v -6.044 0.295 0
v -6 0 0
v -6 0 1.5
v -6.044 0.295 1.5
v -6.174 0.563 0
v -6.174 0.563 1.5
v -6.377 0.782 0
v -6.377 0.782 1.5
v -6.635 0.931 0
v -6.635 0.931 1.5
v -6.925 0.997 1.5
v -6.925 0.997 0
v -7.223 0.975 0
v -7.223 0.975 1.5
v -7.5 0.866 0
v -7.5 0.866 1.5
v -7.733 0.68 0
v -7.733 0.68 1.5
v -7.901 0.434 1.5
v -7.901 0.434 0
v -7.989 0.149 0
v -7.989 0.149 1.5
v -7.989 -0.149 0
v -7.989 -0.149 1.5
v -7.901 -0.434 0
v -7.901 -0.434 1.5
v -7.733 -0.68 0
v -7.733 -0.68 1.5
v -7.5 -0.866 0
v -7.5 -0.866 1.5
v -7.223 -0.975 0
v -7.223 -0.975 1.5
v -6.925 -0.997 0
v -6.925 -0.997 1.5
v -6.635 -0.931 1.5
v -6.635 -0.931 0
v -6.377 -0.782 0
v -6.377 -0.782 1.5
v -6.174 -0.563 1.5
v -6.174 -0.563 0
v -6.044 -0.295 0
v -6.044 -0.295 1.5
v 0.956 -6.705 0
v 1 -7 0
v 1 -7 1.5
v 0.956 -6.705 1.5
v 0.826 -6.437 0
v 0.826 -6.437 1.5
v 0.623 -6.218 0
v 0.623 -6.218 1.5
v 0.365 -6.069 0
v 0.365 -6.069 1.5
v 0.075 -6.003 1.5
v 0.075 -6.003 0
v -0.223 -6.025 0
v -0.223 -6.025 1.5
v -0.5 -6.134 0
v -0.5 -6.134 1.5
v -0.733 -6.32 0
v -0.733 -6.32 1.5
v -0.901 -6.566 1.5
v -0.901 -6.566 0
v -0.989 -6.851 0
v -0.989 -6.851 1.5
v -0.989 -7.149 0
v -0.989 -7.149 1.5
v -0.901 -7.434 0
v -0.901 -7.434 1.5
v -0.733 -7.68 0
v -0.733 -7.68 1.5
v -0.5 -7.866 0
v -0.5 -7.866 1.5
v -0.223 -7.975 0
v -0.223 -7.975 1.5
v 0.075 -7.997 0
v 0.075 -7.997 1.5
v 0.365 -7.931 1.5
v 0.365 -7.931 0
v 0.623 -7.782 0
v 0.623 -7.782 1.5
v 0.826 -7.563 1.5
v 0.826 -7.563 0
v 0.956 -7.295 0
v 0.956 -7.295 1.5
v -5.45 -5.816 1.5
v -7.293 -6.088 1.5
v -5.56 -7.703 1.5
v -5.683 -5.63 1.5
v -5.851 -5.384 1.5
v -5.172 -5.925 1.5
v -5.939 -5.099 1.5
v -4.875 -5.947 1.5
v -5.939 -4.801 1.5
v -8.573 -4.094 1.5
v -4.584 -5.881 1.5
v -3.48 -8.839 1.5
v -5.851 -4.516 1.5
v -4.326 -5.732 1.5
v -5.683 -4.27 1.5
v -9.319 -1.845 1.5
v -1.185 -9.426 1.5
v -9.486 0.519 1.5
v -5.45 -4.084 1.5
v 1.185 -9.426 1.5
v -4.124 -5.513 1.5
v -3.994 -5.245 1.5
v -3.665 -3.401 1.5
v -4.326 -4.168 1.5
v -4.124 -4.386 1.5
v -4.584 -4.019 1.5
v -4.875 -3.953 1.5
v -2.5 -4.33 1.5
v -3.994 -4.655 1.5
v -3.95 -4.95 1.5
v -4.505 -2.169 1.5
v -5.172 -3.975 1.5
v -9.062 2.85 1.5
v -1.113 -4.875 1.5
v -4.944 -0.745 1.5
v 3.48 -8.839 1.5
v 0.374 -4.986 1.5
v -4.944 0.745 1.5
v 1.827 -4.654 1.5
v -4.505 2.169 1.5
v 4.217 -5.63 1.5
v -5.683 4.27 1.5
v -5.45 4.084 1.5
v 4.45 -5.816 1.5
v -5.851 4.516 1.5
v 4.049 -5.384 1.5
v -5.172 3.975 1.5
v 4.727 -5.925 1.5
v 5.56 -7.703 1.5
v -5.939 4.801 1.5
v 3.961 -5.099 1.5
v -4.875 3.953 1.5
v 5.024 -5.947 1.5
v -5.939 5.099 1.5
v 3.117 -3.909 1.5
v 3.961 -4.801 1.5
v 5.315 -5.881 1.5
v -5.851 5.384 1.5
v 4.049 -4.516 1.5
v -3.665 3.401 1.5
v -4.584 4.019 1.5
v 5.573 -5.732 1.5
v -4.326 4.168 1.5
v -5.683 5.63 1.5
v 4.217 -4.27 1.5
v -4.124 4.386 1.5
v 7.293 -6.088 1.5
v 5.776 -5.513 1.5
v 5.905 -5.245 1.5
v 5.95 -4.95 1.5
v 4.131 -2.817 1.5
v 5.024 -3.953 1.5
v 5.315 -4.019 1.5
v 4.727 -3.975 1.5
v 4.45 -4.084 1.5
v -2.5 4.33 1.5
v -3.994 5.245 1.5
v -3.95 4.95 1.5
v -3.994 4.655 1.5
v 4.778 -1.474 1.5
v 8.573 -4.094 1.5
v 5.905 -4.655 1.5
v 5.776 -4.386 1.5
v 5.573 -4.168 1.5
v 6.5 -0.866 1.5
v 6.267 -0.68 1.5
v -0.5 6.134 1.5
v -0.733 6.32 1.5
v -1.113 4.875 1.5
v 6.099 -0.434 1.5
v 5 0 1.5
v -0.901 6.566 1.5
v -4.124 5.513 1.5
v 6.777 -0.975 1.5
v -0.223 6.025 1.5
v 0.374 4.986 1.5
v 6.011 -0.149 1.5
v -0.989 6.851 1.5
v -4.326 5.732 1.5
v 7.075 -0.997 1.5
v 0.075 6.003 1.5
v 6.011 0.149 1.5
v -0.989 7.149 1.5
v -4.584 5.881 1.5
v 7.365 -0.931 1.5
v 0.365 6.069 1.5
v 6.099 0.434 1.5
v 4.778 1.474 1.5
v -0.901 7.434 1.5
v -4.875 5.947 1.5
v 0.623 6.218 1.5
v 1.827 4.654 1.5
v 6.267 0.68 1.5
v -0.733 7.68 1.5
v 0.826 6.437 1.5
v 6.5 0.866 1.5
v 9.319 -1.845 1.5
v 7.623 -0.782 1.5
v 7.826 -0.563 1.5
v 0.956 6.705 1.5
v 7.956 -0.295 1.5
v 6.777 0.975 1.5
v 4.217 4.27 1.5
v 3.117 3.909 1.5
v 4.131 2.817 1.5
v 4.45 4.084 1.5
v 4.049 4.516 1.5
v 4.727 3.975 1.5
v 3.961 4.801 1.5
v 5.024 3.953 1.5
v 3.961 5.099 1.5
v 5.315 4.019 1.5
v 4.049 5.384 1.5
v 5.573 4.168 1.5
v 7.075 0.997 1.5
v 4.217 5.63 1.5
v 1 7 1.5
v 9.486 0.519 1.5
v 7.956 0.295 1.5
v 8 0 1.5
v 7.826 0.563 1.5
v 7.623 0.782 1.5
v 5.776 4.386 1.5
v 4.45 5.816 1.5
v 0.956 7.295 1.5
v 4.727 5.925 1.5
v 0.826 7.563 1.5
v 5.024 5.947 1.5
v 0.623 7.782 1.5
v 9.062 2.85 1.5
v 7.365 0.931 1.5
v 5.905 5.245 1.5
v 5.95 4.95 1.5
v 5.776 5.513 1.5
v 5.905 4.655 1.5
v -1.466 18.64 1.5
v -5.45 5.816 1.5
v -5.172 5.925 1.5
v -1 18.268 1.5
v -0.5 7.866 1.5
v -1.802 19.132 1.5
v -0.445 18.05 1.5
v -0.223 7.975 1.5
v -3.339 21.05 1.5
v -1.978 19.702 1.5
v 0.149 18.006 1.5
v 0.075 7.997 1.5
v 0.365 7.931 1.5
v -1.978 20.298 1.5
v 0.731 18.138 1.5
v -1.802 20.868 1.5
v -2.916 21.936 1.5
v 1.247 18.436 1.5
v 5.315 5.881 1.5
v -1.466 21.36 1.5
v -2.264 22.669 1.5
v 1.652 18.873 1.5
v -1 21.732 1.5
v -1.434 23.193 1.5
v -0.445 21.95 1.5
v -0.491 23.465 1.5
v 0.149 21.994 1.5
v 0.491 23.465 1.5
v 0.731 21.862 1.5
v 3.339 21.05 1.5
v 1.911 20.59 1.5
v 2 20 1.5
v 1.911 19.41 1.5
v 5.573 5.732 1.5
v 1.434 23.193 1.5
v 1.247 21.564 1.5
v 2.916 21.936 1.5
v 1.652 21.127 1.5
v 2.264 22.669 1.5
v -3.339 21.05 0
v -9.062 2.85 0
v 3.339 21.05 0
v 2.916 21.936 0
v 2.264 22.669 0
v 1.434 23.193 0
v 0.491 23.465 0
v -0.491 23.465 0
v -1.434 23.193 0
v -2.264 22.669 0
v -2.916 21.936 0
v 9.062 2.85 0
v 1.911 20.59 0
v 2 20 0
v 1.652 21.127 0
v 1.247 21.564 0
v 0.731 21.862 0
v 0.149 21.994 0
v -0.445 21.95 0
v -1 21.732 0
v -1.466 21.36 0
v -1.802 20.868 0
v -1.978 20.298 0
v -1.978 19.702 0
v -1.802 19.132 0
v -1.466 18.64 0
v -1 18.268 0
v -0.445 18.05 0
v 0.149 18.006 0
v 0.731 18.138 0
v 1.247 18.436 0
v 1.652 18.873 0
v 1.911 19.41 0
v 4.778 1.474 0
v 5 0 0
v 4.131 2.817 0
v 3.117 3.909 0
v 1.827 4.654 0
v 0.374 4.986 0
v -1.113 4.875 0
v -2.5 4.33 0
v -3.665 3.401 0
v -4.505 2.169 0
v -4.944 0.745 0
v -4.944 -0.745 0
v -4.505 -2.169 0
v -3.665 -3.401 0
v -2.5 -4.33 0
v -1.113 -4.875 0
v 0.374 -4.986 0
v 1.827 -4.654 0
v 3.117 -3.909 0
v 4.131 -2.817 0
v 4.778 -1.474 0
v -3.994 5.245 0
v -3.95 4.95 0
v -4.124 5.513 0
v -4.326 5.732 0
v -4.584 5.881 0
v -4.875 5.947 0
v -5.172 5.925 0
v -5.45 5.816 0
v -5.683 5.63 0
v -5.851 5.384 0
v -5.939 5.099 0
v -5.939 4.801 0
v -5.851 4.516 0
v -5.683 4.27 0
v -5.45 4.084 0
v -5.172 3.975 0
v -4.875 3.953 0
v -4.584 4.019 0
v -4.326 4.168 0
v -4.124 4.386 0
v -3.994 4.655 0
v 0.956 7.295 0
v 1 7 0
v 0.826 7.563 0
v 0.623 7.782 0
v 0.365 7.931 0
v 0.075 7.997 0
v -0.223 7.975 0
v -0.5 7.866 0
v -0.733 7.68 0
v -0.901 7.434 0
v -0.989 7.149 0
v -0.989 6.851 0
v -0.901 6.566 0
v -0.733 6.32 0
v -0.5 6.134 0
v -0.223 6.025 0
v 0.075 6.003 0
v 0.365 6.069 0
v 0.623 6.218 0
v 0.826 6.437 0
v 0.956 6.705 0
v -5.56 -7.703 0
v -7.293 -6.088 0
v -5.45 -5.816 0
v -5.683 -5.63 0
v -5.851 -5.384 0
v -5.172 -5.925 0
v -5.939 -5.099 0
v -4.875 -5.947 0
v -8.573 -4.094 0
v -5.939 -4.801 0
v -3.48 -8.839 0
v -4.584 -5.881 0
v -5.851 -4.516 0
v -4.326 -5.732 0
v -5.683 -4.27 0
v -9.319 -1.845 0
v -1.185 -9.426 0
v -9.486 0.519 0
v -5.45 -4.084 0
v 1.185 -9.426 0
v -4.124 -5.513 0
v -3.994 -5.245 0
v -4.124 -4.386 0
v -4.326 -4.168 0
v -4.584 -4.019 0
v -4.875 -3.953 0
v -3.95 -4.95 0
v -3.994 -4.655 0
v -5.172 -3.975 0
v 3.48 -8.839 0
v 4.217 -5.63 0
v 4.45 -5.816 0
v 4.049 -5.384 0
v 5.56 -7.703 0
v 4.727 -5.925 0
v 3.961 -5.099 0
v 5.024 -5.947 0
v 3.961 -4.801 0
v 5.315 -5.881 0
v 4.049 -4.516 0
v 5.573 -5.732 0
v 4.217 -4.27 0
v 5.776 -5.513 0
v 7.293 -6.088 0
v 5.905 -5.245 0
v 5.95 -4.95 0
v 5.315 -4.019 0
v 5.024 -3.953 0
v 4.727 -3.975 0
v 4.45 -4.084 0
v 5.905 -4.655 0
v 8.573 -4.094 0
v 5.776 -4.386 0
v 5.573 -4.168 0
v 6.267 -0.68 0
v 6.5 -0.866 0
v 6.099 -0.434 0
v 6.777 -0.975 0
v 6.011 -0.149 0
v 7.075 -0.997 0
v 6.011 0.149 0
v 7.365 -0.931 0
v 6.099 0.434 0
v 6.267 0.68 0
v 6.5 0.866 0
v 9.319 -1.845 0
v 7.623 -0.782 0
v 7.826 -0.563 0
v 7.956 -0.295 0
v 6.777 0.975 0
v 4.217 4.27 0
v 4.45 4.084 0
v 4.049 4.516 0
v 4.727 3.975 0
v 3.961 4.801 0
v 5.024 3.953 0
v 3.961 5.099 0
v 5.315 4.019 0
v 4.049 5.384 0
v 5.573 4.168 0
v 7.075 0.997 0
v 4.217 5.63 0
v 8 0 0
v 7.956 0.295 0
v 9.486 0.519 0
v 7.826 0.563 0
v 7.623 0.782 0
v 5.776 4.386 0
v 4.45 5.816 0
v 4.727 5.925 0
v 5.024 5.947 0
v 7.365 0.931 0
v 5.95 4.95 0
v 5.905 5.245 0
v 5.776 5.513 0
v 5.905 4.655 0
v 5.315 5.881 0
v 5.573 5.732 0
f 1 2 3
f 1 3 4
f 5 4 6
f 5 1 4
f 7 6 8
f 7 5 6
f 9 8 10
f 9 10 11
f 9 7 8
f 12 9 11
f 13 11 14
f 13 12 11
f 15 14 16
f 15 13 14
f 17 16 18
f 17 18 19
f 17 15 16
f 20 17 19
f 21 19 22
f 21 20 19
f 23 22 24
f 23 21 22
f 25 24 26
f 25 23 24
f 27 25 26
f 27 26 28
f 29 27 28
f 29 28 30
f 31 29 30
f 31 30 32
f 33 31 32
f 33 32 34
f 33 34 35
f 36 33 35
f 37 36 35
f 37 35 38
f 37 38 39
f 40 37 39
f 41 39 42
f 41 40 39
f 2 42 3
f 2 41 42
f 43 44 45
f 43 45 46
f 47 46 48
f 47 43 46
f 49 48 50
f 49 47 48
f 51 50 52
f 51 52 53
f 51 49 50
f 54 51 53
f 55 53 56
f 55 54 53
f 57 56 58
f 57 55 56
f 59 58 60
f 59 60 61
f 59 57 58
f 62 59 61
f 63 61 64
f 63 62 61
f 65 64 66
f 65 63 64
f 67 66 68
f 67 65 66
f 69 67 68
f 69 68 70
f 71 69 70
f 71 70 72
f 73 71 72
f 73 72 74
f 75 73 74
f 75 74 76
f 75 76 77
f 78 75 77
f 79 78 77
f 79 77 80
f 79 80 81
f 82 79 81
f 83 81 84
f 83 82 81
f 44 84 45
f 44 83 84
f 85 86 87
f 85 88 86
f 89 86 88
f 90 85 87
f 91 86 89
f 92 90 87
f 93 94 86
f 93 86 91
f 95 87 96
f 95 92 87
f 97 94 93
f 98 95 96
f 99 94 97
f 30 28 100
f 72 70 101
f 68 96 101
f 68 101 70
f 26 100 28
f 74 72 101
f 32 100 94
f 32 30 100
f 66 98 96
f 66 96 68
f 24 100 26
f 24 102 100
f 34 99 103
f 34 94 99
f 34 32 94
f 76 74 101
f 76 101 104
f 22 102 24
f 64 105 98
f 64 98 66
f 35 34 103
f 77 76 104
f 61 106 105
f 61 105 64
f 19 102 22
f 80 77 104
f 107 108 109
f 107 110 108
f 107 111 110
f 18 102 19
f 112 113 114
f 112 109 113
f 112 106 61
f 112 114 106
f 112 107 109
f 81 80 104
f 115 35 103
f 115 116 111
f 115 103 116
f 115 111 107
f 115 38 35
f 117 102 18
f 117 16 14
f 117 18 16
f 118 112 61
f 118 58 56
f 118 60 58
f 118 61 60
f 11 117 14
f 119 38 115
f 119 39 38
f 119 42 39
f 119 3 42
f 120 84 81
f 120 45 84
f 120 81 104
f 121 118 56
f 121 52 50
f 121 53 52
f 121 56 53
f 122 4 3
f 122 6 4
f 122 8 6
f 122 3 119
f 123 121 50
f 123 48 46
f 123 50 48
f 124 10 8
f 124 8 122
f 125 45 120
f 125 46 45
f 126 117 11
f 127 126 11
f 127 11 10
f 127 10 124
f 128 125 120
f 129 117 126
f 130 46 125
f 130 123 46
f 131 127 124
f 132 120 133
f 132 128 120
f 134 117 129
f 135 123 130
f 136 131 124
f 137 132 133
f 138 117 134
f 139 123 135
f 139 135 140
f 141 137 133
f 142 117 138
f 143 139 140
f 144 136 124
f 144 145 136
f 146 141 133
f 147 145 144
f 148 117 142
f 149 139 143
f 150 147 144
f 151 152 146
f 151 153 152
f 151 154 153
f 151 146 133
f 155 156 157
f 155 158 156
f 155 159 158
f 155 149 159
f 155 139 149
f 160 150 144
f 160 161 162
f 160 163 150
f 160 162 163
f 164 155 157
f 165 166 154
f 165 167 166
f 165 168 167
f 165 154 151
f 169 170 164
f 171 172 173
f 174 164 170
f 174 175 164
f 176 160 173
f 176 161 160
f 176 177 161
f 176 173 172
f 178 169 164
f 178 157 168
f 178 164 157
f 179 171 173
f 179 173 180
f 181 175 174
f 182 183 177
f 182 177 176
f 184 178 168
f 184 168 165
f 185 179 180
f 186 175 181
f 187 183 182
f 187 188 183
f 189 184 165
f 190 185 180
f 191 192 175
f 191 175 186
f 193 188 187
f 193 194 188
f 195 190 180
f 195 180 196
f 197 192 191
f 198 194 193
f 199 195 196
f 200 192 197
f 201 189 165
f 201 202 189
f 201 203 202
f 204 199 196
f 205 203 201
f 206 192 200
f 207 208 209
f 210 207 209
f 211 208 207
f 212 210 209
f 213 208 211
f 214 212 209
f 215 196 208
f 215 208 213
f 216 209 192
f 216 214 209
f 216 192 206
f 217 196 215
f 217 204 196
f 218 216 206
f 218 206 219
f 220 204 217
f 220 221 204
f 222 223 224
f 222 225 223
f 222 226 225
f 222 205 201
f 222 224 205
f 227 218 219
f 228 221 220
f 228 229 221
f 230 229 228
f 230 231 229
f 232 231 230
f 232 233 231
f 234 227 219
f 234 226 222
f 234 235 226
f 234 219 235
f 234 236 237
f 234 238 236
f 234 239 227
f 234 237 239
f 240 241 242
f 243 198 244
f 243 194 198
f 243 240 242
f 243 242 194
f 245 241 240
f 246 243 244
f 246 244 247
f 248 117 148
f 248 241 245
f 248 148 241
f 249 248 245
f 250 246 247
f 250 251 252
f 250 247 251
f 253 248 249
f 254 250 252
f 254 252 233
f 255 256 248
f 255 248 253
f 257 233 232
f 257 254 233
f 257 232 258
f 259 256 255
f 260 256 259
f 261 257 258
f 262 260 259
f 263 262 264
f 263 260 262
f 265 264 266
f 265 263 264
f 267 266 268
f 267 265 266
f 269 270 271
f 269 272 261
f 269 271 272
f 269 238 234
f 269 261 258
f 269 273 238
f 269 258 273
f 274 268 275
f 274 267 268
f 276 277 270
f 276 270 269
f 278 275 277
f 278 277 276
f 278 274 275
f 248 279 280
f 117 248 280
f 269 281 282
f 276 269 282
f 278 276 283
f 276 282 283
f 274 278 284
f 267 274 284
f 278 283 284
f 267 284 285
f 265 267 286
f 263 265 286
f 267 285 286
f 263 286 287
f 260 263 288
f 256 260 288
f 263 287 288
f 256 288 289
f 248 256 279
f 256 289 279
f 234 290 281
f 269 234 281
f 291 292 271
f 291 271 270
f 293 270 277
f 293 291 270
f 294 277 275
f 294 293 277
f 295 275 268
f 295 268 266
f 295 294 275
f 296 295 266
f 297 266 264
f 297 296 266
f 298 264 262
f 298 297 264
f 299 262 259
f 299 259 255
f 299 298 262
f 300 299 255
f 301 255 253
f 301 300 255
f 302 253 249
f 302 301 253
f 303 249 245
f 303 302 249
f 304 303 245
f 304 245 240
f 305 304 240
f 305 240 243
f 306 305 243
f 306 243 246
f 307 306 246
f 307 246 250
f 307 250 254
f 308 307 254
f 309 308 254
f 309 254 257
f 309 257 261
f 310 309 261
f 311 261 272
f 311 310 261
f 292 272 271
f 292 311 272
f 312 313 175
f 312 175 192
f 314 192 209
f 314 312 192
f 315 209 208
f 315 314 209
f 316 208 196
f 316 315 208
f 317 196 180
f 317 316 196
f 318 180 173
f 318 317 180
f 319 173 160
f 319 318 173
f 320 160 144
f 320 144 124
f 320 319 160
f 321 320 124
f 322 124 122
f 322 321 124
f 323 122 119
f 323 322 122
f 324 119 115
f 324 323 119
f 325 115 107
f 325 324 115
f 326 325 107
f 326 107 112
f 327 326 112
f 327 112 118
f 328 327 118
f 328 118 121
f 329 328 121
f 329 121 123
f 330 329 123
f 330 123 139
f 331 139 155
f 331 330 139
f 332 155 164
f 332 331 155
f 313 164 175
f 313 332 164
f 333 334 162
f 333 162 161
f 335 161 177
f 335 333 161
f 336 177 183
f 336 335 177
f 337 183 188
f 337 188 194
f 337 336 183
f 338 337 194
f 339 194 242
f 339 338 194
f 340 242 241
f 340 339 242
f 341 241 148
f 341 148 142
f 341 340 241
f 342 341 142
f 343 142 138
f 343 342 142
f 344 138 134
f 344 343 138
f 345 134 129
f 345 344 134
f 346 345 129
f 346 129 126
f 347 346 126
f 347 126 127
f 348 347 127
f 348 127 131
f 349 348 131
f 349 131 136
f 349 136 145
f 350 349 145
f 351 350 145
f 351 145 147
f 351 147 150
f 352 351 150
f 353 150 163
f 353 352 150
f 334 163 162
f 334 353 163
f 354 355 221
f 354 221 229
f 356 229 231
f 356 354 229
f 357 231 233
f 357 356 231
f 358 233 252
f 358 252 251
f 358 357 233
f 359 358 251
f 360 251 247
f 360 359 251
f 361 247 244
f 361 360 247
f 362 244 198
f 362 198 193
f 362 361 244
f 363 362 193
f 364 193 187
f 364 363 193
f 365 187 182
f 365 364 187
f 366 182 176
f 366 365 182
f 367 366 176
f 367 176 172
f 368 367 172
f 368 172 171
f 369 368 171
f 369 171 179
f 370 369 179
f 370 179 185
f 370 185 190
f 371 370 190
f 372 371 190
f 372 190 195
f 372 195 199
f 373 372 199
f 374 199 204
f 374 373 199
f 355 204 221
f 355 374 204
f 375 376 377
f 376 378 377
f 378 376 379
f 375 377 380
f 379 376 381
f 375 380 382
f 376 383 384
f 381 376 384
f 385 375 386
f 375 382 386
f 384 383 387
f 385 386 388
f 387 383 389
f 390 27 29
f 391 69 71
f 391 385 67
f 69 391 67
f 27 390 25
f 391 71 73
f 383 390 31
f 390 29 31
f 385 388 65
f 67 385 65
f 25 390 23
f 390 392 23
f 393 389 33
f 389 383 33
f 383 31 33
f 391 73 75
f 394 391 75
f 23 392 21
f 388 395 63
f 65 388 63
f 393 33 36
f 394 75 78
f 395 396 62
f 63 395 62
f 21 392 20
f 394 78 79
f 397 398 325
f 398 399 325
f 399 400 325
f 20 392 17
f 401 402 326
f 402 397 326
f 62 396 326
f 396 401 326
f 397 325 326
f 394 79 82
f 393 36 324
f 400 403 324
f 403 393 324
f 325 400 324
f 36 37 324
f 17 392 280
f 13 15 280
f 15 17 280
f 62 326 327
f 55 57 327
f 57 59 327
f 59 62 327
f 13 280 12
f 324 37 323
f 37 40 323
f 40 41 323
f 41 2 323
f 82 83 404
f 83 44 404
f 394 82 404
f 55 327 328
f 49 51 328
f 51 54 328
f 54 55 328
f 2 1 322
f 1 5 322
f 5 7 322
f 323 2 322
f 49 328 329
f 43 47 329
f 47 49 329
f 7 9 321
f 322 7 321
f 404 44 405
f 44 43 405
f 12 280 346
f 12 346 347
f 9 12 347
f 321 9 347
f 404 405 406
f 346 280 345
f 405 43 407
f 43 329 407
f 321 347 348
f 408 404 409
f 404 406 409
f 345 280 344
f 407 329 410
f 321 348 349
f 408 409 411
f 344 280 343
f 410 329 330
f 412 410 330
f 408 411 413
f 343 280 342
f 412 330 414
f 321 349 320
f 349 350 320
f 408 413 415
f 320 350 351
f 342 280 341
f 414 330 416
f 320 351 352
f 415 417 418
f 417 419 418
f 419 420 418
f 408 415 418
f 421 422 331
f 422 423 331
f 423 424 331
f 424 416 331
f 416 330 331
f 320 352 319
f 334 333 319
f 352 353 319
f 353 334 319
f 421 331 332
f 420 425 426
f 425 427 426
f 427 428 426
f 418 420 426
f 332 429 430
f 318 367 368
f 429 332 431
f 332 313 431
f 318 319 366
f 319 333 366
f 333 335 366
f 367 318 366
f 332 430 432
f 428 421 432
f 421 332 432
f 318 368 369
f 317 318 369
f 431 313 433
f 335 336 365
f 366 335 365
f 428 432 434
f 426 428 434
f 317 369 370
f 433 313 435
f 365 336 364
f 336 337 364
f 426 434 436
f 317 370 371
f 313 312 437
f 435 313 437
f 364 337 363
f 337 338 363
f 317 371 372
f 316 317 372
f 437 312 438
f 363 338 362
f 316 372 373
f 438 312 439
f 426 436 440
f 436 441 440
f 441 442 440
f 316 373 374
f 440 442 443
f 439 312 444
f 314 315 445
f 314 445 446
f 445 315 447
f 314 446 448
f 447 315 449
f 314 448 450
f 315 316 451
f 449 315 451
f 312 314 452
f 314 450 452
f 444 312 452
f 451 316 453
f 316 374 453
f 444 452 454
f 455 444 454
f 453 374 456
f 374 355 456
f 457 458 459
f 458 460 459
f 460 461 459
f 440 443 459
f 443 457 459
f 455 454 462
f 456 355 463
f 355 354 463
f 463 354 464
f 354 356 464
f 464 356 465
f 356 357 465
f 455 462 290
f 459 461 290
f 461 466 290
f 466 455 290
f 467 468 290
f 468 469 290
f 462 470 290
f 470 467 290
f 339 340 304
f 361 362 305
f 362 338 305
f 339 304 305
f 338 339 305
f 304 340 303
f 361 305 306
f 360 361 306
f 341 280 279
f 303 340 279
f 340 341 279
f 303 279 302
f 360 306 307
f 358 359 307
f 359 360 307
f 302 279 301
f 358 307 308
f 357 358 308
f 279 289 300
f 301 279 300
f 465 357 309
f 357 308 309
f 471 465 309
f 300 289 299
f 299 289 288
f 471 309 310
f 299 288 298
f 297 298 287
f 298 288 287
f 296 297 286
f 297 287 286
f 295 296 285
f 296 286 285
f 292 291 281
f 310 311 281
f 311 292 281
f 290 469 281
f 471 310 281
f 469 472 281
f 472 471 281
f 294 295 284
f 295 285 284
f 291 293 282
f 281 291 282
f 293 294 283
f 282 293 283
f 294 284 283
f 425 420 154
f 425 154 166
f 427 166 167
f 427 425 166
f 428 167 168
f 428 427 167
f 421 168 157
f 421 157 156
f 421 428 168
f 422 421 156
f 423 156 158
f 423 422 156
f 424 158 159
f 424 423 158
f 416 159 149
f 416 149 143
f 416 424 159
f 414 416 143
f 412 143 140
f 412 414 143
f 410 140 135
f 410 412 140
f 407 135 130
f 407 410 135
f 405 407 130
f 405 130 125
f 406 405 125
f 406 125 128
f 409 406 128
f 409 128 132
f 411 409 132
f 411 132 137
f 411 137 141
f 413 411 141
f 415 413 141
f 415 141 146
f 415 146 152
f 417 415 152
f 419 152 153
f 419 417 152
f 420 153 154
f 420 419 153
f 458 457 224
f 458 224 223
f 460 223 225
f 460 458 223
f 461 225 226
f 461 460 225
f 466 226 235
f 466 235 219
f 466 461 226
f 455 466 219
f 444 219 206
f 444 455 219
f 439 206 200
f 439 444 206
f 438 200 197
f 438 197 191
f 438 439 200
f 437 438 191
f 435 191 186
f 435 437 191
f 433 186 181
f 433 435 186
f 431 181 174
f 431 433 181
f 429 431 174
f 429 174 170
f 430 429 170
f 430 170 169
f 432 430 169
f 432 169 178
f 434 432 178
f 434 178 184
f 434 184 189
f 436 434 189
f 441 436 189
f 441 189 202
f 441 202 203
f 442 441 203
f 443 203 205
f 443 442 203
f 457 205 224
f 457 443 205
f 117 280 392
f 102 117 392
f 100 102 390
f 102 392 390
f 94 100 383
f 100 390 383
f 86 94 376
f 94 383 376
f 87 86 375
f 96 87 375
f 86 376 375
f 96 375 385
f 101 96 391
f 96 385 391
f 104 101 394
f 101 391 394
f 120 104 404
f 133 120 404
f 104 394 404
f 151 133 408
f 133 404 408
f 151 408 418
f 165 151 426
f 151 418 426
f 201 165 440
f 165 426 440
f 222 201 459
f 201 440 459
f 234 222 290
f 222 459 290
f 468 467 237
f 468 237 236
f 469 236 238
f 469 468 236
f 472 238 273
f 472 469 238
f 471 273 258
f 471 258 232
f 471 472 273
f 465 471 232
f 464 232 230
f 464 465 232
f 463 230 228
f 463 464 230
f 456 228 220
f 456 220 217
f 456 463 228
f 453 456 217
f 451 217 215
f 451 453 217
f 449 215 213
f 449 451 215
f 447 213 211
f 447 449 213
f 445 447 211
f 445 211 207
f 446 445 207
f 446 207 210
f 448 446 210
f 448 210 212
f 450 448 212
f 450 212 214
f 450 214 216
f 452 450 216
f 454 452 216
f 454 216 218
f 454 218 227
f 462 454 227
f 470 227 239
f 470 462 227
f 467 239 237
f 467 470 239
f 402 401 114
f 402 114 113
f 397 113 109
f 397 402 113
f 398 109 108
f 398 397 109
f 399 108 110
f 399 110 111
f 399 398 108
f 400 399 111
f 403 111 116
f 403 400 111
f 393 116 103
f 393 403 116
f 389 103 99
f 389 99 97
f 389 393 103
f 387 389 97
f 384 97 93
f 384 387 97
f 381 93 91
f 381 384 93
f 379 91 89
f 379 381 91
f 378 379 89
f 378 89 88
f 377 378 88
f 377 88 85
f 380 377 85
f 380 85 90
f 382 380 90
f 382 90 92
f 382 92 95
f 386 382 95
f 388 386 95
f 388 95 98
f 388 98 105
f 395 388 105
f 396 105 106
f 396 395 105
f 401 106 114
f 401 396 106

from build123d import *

# Parameters (mm, degrees)
F0_R     = 1
F0_R_2   = 5
F0_R_3   = 2
F1_DEPTH = 1.5


with BuildPart() as f1:
    # F0 (on Top) → F1 (new body)
    with BuildSketch(Plane.XY):
        with BuildLine():
            Line((9.062422, 2.85), (3.338787, 21.05))
            ThreePointArc((3.338787, 21.05), (0, 23.5), (-3.338787, 21.05))
            Line((-3.338787, 21.05), (-9.062422, 2.85))
            ThreePointArc((-9.062422, 2.85), (0, -9.5), (9.062422, 2.85))
        make_face()
        with Locations((-4.949747, -4.949747)):
            Circle(F0_R, mode=Mode.SUBTRACT)
        with Locations((-7, 0)):
            Circle(F0_R, mode=Mode.SUBTRACT)
        with Locations((-4.949747, 4.949747)):
            Circle(F0_R, mode=Mode.SUBTRACT)
        with Locations((0, -7)):
            Circle(F0_R, mode=Mode.SUBTRACT)
        with Locations((4.949747, -4.949747)):
            Circle(F0_R, mode=Mode.SUBTRACT)
        Circle(F0_R_2, mode=Mode.SUBTRACT)
        with Locations((7, 0)):
            Circle(F0_R, mode=Mode.SUBTRACT)
        with Locations((4.949747, 4.949747)):
            Circle(F0_R, mode=Mode.SUBTRACT)
        with Locations((0, 7)):
            Circle(F0_R, mode=Mode.SUBTRACT)
        with Locations((0, 20)):
            Circle(F0_R_3, mode=Mode.SUBTRACT)
    extrude(amount=F1_DEPTH)


solid = f1.part
